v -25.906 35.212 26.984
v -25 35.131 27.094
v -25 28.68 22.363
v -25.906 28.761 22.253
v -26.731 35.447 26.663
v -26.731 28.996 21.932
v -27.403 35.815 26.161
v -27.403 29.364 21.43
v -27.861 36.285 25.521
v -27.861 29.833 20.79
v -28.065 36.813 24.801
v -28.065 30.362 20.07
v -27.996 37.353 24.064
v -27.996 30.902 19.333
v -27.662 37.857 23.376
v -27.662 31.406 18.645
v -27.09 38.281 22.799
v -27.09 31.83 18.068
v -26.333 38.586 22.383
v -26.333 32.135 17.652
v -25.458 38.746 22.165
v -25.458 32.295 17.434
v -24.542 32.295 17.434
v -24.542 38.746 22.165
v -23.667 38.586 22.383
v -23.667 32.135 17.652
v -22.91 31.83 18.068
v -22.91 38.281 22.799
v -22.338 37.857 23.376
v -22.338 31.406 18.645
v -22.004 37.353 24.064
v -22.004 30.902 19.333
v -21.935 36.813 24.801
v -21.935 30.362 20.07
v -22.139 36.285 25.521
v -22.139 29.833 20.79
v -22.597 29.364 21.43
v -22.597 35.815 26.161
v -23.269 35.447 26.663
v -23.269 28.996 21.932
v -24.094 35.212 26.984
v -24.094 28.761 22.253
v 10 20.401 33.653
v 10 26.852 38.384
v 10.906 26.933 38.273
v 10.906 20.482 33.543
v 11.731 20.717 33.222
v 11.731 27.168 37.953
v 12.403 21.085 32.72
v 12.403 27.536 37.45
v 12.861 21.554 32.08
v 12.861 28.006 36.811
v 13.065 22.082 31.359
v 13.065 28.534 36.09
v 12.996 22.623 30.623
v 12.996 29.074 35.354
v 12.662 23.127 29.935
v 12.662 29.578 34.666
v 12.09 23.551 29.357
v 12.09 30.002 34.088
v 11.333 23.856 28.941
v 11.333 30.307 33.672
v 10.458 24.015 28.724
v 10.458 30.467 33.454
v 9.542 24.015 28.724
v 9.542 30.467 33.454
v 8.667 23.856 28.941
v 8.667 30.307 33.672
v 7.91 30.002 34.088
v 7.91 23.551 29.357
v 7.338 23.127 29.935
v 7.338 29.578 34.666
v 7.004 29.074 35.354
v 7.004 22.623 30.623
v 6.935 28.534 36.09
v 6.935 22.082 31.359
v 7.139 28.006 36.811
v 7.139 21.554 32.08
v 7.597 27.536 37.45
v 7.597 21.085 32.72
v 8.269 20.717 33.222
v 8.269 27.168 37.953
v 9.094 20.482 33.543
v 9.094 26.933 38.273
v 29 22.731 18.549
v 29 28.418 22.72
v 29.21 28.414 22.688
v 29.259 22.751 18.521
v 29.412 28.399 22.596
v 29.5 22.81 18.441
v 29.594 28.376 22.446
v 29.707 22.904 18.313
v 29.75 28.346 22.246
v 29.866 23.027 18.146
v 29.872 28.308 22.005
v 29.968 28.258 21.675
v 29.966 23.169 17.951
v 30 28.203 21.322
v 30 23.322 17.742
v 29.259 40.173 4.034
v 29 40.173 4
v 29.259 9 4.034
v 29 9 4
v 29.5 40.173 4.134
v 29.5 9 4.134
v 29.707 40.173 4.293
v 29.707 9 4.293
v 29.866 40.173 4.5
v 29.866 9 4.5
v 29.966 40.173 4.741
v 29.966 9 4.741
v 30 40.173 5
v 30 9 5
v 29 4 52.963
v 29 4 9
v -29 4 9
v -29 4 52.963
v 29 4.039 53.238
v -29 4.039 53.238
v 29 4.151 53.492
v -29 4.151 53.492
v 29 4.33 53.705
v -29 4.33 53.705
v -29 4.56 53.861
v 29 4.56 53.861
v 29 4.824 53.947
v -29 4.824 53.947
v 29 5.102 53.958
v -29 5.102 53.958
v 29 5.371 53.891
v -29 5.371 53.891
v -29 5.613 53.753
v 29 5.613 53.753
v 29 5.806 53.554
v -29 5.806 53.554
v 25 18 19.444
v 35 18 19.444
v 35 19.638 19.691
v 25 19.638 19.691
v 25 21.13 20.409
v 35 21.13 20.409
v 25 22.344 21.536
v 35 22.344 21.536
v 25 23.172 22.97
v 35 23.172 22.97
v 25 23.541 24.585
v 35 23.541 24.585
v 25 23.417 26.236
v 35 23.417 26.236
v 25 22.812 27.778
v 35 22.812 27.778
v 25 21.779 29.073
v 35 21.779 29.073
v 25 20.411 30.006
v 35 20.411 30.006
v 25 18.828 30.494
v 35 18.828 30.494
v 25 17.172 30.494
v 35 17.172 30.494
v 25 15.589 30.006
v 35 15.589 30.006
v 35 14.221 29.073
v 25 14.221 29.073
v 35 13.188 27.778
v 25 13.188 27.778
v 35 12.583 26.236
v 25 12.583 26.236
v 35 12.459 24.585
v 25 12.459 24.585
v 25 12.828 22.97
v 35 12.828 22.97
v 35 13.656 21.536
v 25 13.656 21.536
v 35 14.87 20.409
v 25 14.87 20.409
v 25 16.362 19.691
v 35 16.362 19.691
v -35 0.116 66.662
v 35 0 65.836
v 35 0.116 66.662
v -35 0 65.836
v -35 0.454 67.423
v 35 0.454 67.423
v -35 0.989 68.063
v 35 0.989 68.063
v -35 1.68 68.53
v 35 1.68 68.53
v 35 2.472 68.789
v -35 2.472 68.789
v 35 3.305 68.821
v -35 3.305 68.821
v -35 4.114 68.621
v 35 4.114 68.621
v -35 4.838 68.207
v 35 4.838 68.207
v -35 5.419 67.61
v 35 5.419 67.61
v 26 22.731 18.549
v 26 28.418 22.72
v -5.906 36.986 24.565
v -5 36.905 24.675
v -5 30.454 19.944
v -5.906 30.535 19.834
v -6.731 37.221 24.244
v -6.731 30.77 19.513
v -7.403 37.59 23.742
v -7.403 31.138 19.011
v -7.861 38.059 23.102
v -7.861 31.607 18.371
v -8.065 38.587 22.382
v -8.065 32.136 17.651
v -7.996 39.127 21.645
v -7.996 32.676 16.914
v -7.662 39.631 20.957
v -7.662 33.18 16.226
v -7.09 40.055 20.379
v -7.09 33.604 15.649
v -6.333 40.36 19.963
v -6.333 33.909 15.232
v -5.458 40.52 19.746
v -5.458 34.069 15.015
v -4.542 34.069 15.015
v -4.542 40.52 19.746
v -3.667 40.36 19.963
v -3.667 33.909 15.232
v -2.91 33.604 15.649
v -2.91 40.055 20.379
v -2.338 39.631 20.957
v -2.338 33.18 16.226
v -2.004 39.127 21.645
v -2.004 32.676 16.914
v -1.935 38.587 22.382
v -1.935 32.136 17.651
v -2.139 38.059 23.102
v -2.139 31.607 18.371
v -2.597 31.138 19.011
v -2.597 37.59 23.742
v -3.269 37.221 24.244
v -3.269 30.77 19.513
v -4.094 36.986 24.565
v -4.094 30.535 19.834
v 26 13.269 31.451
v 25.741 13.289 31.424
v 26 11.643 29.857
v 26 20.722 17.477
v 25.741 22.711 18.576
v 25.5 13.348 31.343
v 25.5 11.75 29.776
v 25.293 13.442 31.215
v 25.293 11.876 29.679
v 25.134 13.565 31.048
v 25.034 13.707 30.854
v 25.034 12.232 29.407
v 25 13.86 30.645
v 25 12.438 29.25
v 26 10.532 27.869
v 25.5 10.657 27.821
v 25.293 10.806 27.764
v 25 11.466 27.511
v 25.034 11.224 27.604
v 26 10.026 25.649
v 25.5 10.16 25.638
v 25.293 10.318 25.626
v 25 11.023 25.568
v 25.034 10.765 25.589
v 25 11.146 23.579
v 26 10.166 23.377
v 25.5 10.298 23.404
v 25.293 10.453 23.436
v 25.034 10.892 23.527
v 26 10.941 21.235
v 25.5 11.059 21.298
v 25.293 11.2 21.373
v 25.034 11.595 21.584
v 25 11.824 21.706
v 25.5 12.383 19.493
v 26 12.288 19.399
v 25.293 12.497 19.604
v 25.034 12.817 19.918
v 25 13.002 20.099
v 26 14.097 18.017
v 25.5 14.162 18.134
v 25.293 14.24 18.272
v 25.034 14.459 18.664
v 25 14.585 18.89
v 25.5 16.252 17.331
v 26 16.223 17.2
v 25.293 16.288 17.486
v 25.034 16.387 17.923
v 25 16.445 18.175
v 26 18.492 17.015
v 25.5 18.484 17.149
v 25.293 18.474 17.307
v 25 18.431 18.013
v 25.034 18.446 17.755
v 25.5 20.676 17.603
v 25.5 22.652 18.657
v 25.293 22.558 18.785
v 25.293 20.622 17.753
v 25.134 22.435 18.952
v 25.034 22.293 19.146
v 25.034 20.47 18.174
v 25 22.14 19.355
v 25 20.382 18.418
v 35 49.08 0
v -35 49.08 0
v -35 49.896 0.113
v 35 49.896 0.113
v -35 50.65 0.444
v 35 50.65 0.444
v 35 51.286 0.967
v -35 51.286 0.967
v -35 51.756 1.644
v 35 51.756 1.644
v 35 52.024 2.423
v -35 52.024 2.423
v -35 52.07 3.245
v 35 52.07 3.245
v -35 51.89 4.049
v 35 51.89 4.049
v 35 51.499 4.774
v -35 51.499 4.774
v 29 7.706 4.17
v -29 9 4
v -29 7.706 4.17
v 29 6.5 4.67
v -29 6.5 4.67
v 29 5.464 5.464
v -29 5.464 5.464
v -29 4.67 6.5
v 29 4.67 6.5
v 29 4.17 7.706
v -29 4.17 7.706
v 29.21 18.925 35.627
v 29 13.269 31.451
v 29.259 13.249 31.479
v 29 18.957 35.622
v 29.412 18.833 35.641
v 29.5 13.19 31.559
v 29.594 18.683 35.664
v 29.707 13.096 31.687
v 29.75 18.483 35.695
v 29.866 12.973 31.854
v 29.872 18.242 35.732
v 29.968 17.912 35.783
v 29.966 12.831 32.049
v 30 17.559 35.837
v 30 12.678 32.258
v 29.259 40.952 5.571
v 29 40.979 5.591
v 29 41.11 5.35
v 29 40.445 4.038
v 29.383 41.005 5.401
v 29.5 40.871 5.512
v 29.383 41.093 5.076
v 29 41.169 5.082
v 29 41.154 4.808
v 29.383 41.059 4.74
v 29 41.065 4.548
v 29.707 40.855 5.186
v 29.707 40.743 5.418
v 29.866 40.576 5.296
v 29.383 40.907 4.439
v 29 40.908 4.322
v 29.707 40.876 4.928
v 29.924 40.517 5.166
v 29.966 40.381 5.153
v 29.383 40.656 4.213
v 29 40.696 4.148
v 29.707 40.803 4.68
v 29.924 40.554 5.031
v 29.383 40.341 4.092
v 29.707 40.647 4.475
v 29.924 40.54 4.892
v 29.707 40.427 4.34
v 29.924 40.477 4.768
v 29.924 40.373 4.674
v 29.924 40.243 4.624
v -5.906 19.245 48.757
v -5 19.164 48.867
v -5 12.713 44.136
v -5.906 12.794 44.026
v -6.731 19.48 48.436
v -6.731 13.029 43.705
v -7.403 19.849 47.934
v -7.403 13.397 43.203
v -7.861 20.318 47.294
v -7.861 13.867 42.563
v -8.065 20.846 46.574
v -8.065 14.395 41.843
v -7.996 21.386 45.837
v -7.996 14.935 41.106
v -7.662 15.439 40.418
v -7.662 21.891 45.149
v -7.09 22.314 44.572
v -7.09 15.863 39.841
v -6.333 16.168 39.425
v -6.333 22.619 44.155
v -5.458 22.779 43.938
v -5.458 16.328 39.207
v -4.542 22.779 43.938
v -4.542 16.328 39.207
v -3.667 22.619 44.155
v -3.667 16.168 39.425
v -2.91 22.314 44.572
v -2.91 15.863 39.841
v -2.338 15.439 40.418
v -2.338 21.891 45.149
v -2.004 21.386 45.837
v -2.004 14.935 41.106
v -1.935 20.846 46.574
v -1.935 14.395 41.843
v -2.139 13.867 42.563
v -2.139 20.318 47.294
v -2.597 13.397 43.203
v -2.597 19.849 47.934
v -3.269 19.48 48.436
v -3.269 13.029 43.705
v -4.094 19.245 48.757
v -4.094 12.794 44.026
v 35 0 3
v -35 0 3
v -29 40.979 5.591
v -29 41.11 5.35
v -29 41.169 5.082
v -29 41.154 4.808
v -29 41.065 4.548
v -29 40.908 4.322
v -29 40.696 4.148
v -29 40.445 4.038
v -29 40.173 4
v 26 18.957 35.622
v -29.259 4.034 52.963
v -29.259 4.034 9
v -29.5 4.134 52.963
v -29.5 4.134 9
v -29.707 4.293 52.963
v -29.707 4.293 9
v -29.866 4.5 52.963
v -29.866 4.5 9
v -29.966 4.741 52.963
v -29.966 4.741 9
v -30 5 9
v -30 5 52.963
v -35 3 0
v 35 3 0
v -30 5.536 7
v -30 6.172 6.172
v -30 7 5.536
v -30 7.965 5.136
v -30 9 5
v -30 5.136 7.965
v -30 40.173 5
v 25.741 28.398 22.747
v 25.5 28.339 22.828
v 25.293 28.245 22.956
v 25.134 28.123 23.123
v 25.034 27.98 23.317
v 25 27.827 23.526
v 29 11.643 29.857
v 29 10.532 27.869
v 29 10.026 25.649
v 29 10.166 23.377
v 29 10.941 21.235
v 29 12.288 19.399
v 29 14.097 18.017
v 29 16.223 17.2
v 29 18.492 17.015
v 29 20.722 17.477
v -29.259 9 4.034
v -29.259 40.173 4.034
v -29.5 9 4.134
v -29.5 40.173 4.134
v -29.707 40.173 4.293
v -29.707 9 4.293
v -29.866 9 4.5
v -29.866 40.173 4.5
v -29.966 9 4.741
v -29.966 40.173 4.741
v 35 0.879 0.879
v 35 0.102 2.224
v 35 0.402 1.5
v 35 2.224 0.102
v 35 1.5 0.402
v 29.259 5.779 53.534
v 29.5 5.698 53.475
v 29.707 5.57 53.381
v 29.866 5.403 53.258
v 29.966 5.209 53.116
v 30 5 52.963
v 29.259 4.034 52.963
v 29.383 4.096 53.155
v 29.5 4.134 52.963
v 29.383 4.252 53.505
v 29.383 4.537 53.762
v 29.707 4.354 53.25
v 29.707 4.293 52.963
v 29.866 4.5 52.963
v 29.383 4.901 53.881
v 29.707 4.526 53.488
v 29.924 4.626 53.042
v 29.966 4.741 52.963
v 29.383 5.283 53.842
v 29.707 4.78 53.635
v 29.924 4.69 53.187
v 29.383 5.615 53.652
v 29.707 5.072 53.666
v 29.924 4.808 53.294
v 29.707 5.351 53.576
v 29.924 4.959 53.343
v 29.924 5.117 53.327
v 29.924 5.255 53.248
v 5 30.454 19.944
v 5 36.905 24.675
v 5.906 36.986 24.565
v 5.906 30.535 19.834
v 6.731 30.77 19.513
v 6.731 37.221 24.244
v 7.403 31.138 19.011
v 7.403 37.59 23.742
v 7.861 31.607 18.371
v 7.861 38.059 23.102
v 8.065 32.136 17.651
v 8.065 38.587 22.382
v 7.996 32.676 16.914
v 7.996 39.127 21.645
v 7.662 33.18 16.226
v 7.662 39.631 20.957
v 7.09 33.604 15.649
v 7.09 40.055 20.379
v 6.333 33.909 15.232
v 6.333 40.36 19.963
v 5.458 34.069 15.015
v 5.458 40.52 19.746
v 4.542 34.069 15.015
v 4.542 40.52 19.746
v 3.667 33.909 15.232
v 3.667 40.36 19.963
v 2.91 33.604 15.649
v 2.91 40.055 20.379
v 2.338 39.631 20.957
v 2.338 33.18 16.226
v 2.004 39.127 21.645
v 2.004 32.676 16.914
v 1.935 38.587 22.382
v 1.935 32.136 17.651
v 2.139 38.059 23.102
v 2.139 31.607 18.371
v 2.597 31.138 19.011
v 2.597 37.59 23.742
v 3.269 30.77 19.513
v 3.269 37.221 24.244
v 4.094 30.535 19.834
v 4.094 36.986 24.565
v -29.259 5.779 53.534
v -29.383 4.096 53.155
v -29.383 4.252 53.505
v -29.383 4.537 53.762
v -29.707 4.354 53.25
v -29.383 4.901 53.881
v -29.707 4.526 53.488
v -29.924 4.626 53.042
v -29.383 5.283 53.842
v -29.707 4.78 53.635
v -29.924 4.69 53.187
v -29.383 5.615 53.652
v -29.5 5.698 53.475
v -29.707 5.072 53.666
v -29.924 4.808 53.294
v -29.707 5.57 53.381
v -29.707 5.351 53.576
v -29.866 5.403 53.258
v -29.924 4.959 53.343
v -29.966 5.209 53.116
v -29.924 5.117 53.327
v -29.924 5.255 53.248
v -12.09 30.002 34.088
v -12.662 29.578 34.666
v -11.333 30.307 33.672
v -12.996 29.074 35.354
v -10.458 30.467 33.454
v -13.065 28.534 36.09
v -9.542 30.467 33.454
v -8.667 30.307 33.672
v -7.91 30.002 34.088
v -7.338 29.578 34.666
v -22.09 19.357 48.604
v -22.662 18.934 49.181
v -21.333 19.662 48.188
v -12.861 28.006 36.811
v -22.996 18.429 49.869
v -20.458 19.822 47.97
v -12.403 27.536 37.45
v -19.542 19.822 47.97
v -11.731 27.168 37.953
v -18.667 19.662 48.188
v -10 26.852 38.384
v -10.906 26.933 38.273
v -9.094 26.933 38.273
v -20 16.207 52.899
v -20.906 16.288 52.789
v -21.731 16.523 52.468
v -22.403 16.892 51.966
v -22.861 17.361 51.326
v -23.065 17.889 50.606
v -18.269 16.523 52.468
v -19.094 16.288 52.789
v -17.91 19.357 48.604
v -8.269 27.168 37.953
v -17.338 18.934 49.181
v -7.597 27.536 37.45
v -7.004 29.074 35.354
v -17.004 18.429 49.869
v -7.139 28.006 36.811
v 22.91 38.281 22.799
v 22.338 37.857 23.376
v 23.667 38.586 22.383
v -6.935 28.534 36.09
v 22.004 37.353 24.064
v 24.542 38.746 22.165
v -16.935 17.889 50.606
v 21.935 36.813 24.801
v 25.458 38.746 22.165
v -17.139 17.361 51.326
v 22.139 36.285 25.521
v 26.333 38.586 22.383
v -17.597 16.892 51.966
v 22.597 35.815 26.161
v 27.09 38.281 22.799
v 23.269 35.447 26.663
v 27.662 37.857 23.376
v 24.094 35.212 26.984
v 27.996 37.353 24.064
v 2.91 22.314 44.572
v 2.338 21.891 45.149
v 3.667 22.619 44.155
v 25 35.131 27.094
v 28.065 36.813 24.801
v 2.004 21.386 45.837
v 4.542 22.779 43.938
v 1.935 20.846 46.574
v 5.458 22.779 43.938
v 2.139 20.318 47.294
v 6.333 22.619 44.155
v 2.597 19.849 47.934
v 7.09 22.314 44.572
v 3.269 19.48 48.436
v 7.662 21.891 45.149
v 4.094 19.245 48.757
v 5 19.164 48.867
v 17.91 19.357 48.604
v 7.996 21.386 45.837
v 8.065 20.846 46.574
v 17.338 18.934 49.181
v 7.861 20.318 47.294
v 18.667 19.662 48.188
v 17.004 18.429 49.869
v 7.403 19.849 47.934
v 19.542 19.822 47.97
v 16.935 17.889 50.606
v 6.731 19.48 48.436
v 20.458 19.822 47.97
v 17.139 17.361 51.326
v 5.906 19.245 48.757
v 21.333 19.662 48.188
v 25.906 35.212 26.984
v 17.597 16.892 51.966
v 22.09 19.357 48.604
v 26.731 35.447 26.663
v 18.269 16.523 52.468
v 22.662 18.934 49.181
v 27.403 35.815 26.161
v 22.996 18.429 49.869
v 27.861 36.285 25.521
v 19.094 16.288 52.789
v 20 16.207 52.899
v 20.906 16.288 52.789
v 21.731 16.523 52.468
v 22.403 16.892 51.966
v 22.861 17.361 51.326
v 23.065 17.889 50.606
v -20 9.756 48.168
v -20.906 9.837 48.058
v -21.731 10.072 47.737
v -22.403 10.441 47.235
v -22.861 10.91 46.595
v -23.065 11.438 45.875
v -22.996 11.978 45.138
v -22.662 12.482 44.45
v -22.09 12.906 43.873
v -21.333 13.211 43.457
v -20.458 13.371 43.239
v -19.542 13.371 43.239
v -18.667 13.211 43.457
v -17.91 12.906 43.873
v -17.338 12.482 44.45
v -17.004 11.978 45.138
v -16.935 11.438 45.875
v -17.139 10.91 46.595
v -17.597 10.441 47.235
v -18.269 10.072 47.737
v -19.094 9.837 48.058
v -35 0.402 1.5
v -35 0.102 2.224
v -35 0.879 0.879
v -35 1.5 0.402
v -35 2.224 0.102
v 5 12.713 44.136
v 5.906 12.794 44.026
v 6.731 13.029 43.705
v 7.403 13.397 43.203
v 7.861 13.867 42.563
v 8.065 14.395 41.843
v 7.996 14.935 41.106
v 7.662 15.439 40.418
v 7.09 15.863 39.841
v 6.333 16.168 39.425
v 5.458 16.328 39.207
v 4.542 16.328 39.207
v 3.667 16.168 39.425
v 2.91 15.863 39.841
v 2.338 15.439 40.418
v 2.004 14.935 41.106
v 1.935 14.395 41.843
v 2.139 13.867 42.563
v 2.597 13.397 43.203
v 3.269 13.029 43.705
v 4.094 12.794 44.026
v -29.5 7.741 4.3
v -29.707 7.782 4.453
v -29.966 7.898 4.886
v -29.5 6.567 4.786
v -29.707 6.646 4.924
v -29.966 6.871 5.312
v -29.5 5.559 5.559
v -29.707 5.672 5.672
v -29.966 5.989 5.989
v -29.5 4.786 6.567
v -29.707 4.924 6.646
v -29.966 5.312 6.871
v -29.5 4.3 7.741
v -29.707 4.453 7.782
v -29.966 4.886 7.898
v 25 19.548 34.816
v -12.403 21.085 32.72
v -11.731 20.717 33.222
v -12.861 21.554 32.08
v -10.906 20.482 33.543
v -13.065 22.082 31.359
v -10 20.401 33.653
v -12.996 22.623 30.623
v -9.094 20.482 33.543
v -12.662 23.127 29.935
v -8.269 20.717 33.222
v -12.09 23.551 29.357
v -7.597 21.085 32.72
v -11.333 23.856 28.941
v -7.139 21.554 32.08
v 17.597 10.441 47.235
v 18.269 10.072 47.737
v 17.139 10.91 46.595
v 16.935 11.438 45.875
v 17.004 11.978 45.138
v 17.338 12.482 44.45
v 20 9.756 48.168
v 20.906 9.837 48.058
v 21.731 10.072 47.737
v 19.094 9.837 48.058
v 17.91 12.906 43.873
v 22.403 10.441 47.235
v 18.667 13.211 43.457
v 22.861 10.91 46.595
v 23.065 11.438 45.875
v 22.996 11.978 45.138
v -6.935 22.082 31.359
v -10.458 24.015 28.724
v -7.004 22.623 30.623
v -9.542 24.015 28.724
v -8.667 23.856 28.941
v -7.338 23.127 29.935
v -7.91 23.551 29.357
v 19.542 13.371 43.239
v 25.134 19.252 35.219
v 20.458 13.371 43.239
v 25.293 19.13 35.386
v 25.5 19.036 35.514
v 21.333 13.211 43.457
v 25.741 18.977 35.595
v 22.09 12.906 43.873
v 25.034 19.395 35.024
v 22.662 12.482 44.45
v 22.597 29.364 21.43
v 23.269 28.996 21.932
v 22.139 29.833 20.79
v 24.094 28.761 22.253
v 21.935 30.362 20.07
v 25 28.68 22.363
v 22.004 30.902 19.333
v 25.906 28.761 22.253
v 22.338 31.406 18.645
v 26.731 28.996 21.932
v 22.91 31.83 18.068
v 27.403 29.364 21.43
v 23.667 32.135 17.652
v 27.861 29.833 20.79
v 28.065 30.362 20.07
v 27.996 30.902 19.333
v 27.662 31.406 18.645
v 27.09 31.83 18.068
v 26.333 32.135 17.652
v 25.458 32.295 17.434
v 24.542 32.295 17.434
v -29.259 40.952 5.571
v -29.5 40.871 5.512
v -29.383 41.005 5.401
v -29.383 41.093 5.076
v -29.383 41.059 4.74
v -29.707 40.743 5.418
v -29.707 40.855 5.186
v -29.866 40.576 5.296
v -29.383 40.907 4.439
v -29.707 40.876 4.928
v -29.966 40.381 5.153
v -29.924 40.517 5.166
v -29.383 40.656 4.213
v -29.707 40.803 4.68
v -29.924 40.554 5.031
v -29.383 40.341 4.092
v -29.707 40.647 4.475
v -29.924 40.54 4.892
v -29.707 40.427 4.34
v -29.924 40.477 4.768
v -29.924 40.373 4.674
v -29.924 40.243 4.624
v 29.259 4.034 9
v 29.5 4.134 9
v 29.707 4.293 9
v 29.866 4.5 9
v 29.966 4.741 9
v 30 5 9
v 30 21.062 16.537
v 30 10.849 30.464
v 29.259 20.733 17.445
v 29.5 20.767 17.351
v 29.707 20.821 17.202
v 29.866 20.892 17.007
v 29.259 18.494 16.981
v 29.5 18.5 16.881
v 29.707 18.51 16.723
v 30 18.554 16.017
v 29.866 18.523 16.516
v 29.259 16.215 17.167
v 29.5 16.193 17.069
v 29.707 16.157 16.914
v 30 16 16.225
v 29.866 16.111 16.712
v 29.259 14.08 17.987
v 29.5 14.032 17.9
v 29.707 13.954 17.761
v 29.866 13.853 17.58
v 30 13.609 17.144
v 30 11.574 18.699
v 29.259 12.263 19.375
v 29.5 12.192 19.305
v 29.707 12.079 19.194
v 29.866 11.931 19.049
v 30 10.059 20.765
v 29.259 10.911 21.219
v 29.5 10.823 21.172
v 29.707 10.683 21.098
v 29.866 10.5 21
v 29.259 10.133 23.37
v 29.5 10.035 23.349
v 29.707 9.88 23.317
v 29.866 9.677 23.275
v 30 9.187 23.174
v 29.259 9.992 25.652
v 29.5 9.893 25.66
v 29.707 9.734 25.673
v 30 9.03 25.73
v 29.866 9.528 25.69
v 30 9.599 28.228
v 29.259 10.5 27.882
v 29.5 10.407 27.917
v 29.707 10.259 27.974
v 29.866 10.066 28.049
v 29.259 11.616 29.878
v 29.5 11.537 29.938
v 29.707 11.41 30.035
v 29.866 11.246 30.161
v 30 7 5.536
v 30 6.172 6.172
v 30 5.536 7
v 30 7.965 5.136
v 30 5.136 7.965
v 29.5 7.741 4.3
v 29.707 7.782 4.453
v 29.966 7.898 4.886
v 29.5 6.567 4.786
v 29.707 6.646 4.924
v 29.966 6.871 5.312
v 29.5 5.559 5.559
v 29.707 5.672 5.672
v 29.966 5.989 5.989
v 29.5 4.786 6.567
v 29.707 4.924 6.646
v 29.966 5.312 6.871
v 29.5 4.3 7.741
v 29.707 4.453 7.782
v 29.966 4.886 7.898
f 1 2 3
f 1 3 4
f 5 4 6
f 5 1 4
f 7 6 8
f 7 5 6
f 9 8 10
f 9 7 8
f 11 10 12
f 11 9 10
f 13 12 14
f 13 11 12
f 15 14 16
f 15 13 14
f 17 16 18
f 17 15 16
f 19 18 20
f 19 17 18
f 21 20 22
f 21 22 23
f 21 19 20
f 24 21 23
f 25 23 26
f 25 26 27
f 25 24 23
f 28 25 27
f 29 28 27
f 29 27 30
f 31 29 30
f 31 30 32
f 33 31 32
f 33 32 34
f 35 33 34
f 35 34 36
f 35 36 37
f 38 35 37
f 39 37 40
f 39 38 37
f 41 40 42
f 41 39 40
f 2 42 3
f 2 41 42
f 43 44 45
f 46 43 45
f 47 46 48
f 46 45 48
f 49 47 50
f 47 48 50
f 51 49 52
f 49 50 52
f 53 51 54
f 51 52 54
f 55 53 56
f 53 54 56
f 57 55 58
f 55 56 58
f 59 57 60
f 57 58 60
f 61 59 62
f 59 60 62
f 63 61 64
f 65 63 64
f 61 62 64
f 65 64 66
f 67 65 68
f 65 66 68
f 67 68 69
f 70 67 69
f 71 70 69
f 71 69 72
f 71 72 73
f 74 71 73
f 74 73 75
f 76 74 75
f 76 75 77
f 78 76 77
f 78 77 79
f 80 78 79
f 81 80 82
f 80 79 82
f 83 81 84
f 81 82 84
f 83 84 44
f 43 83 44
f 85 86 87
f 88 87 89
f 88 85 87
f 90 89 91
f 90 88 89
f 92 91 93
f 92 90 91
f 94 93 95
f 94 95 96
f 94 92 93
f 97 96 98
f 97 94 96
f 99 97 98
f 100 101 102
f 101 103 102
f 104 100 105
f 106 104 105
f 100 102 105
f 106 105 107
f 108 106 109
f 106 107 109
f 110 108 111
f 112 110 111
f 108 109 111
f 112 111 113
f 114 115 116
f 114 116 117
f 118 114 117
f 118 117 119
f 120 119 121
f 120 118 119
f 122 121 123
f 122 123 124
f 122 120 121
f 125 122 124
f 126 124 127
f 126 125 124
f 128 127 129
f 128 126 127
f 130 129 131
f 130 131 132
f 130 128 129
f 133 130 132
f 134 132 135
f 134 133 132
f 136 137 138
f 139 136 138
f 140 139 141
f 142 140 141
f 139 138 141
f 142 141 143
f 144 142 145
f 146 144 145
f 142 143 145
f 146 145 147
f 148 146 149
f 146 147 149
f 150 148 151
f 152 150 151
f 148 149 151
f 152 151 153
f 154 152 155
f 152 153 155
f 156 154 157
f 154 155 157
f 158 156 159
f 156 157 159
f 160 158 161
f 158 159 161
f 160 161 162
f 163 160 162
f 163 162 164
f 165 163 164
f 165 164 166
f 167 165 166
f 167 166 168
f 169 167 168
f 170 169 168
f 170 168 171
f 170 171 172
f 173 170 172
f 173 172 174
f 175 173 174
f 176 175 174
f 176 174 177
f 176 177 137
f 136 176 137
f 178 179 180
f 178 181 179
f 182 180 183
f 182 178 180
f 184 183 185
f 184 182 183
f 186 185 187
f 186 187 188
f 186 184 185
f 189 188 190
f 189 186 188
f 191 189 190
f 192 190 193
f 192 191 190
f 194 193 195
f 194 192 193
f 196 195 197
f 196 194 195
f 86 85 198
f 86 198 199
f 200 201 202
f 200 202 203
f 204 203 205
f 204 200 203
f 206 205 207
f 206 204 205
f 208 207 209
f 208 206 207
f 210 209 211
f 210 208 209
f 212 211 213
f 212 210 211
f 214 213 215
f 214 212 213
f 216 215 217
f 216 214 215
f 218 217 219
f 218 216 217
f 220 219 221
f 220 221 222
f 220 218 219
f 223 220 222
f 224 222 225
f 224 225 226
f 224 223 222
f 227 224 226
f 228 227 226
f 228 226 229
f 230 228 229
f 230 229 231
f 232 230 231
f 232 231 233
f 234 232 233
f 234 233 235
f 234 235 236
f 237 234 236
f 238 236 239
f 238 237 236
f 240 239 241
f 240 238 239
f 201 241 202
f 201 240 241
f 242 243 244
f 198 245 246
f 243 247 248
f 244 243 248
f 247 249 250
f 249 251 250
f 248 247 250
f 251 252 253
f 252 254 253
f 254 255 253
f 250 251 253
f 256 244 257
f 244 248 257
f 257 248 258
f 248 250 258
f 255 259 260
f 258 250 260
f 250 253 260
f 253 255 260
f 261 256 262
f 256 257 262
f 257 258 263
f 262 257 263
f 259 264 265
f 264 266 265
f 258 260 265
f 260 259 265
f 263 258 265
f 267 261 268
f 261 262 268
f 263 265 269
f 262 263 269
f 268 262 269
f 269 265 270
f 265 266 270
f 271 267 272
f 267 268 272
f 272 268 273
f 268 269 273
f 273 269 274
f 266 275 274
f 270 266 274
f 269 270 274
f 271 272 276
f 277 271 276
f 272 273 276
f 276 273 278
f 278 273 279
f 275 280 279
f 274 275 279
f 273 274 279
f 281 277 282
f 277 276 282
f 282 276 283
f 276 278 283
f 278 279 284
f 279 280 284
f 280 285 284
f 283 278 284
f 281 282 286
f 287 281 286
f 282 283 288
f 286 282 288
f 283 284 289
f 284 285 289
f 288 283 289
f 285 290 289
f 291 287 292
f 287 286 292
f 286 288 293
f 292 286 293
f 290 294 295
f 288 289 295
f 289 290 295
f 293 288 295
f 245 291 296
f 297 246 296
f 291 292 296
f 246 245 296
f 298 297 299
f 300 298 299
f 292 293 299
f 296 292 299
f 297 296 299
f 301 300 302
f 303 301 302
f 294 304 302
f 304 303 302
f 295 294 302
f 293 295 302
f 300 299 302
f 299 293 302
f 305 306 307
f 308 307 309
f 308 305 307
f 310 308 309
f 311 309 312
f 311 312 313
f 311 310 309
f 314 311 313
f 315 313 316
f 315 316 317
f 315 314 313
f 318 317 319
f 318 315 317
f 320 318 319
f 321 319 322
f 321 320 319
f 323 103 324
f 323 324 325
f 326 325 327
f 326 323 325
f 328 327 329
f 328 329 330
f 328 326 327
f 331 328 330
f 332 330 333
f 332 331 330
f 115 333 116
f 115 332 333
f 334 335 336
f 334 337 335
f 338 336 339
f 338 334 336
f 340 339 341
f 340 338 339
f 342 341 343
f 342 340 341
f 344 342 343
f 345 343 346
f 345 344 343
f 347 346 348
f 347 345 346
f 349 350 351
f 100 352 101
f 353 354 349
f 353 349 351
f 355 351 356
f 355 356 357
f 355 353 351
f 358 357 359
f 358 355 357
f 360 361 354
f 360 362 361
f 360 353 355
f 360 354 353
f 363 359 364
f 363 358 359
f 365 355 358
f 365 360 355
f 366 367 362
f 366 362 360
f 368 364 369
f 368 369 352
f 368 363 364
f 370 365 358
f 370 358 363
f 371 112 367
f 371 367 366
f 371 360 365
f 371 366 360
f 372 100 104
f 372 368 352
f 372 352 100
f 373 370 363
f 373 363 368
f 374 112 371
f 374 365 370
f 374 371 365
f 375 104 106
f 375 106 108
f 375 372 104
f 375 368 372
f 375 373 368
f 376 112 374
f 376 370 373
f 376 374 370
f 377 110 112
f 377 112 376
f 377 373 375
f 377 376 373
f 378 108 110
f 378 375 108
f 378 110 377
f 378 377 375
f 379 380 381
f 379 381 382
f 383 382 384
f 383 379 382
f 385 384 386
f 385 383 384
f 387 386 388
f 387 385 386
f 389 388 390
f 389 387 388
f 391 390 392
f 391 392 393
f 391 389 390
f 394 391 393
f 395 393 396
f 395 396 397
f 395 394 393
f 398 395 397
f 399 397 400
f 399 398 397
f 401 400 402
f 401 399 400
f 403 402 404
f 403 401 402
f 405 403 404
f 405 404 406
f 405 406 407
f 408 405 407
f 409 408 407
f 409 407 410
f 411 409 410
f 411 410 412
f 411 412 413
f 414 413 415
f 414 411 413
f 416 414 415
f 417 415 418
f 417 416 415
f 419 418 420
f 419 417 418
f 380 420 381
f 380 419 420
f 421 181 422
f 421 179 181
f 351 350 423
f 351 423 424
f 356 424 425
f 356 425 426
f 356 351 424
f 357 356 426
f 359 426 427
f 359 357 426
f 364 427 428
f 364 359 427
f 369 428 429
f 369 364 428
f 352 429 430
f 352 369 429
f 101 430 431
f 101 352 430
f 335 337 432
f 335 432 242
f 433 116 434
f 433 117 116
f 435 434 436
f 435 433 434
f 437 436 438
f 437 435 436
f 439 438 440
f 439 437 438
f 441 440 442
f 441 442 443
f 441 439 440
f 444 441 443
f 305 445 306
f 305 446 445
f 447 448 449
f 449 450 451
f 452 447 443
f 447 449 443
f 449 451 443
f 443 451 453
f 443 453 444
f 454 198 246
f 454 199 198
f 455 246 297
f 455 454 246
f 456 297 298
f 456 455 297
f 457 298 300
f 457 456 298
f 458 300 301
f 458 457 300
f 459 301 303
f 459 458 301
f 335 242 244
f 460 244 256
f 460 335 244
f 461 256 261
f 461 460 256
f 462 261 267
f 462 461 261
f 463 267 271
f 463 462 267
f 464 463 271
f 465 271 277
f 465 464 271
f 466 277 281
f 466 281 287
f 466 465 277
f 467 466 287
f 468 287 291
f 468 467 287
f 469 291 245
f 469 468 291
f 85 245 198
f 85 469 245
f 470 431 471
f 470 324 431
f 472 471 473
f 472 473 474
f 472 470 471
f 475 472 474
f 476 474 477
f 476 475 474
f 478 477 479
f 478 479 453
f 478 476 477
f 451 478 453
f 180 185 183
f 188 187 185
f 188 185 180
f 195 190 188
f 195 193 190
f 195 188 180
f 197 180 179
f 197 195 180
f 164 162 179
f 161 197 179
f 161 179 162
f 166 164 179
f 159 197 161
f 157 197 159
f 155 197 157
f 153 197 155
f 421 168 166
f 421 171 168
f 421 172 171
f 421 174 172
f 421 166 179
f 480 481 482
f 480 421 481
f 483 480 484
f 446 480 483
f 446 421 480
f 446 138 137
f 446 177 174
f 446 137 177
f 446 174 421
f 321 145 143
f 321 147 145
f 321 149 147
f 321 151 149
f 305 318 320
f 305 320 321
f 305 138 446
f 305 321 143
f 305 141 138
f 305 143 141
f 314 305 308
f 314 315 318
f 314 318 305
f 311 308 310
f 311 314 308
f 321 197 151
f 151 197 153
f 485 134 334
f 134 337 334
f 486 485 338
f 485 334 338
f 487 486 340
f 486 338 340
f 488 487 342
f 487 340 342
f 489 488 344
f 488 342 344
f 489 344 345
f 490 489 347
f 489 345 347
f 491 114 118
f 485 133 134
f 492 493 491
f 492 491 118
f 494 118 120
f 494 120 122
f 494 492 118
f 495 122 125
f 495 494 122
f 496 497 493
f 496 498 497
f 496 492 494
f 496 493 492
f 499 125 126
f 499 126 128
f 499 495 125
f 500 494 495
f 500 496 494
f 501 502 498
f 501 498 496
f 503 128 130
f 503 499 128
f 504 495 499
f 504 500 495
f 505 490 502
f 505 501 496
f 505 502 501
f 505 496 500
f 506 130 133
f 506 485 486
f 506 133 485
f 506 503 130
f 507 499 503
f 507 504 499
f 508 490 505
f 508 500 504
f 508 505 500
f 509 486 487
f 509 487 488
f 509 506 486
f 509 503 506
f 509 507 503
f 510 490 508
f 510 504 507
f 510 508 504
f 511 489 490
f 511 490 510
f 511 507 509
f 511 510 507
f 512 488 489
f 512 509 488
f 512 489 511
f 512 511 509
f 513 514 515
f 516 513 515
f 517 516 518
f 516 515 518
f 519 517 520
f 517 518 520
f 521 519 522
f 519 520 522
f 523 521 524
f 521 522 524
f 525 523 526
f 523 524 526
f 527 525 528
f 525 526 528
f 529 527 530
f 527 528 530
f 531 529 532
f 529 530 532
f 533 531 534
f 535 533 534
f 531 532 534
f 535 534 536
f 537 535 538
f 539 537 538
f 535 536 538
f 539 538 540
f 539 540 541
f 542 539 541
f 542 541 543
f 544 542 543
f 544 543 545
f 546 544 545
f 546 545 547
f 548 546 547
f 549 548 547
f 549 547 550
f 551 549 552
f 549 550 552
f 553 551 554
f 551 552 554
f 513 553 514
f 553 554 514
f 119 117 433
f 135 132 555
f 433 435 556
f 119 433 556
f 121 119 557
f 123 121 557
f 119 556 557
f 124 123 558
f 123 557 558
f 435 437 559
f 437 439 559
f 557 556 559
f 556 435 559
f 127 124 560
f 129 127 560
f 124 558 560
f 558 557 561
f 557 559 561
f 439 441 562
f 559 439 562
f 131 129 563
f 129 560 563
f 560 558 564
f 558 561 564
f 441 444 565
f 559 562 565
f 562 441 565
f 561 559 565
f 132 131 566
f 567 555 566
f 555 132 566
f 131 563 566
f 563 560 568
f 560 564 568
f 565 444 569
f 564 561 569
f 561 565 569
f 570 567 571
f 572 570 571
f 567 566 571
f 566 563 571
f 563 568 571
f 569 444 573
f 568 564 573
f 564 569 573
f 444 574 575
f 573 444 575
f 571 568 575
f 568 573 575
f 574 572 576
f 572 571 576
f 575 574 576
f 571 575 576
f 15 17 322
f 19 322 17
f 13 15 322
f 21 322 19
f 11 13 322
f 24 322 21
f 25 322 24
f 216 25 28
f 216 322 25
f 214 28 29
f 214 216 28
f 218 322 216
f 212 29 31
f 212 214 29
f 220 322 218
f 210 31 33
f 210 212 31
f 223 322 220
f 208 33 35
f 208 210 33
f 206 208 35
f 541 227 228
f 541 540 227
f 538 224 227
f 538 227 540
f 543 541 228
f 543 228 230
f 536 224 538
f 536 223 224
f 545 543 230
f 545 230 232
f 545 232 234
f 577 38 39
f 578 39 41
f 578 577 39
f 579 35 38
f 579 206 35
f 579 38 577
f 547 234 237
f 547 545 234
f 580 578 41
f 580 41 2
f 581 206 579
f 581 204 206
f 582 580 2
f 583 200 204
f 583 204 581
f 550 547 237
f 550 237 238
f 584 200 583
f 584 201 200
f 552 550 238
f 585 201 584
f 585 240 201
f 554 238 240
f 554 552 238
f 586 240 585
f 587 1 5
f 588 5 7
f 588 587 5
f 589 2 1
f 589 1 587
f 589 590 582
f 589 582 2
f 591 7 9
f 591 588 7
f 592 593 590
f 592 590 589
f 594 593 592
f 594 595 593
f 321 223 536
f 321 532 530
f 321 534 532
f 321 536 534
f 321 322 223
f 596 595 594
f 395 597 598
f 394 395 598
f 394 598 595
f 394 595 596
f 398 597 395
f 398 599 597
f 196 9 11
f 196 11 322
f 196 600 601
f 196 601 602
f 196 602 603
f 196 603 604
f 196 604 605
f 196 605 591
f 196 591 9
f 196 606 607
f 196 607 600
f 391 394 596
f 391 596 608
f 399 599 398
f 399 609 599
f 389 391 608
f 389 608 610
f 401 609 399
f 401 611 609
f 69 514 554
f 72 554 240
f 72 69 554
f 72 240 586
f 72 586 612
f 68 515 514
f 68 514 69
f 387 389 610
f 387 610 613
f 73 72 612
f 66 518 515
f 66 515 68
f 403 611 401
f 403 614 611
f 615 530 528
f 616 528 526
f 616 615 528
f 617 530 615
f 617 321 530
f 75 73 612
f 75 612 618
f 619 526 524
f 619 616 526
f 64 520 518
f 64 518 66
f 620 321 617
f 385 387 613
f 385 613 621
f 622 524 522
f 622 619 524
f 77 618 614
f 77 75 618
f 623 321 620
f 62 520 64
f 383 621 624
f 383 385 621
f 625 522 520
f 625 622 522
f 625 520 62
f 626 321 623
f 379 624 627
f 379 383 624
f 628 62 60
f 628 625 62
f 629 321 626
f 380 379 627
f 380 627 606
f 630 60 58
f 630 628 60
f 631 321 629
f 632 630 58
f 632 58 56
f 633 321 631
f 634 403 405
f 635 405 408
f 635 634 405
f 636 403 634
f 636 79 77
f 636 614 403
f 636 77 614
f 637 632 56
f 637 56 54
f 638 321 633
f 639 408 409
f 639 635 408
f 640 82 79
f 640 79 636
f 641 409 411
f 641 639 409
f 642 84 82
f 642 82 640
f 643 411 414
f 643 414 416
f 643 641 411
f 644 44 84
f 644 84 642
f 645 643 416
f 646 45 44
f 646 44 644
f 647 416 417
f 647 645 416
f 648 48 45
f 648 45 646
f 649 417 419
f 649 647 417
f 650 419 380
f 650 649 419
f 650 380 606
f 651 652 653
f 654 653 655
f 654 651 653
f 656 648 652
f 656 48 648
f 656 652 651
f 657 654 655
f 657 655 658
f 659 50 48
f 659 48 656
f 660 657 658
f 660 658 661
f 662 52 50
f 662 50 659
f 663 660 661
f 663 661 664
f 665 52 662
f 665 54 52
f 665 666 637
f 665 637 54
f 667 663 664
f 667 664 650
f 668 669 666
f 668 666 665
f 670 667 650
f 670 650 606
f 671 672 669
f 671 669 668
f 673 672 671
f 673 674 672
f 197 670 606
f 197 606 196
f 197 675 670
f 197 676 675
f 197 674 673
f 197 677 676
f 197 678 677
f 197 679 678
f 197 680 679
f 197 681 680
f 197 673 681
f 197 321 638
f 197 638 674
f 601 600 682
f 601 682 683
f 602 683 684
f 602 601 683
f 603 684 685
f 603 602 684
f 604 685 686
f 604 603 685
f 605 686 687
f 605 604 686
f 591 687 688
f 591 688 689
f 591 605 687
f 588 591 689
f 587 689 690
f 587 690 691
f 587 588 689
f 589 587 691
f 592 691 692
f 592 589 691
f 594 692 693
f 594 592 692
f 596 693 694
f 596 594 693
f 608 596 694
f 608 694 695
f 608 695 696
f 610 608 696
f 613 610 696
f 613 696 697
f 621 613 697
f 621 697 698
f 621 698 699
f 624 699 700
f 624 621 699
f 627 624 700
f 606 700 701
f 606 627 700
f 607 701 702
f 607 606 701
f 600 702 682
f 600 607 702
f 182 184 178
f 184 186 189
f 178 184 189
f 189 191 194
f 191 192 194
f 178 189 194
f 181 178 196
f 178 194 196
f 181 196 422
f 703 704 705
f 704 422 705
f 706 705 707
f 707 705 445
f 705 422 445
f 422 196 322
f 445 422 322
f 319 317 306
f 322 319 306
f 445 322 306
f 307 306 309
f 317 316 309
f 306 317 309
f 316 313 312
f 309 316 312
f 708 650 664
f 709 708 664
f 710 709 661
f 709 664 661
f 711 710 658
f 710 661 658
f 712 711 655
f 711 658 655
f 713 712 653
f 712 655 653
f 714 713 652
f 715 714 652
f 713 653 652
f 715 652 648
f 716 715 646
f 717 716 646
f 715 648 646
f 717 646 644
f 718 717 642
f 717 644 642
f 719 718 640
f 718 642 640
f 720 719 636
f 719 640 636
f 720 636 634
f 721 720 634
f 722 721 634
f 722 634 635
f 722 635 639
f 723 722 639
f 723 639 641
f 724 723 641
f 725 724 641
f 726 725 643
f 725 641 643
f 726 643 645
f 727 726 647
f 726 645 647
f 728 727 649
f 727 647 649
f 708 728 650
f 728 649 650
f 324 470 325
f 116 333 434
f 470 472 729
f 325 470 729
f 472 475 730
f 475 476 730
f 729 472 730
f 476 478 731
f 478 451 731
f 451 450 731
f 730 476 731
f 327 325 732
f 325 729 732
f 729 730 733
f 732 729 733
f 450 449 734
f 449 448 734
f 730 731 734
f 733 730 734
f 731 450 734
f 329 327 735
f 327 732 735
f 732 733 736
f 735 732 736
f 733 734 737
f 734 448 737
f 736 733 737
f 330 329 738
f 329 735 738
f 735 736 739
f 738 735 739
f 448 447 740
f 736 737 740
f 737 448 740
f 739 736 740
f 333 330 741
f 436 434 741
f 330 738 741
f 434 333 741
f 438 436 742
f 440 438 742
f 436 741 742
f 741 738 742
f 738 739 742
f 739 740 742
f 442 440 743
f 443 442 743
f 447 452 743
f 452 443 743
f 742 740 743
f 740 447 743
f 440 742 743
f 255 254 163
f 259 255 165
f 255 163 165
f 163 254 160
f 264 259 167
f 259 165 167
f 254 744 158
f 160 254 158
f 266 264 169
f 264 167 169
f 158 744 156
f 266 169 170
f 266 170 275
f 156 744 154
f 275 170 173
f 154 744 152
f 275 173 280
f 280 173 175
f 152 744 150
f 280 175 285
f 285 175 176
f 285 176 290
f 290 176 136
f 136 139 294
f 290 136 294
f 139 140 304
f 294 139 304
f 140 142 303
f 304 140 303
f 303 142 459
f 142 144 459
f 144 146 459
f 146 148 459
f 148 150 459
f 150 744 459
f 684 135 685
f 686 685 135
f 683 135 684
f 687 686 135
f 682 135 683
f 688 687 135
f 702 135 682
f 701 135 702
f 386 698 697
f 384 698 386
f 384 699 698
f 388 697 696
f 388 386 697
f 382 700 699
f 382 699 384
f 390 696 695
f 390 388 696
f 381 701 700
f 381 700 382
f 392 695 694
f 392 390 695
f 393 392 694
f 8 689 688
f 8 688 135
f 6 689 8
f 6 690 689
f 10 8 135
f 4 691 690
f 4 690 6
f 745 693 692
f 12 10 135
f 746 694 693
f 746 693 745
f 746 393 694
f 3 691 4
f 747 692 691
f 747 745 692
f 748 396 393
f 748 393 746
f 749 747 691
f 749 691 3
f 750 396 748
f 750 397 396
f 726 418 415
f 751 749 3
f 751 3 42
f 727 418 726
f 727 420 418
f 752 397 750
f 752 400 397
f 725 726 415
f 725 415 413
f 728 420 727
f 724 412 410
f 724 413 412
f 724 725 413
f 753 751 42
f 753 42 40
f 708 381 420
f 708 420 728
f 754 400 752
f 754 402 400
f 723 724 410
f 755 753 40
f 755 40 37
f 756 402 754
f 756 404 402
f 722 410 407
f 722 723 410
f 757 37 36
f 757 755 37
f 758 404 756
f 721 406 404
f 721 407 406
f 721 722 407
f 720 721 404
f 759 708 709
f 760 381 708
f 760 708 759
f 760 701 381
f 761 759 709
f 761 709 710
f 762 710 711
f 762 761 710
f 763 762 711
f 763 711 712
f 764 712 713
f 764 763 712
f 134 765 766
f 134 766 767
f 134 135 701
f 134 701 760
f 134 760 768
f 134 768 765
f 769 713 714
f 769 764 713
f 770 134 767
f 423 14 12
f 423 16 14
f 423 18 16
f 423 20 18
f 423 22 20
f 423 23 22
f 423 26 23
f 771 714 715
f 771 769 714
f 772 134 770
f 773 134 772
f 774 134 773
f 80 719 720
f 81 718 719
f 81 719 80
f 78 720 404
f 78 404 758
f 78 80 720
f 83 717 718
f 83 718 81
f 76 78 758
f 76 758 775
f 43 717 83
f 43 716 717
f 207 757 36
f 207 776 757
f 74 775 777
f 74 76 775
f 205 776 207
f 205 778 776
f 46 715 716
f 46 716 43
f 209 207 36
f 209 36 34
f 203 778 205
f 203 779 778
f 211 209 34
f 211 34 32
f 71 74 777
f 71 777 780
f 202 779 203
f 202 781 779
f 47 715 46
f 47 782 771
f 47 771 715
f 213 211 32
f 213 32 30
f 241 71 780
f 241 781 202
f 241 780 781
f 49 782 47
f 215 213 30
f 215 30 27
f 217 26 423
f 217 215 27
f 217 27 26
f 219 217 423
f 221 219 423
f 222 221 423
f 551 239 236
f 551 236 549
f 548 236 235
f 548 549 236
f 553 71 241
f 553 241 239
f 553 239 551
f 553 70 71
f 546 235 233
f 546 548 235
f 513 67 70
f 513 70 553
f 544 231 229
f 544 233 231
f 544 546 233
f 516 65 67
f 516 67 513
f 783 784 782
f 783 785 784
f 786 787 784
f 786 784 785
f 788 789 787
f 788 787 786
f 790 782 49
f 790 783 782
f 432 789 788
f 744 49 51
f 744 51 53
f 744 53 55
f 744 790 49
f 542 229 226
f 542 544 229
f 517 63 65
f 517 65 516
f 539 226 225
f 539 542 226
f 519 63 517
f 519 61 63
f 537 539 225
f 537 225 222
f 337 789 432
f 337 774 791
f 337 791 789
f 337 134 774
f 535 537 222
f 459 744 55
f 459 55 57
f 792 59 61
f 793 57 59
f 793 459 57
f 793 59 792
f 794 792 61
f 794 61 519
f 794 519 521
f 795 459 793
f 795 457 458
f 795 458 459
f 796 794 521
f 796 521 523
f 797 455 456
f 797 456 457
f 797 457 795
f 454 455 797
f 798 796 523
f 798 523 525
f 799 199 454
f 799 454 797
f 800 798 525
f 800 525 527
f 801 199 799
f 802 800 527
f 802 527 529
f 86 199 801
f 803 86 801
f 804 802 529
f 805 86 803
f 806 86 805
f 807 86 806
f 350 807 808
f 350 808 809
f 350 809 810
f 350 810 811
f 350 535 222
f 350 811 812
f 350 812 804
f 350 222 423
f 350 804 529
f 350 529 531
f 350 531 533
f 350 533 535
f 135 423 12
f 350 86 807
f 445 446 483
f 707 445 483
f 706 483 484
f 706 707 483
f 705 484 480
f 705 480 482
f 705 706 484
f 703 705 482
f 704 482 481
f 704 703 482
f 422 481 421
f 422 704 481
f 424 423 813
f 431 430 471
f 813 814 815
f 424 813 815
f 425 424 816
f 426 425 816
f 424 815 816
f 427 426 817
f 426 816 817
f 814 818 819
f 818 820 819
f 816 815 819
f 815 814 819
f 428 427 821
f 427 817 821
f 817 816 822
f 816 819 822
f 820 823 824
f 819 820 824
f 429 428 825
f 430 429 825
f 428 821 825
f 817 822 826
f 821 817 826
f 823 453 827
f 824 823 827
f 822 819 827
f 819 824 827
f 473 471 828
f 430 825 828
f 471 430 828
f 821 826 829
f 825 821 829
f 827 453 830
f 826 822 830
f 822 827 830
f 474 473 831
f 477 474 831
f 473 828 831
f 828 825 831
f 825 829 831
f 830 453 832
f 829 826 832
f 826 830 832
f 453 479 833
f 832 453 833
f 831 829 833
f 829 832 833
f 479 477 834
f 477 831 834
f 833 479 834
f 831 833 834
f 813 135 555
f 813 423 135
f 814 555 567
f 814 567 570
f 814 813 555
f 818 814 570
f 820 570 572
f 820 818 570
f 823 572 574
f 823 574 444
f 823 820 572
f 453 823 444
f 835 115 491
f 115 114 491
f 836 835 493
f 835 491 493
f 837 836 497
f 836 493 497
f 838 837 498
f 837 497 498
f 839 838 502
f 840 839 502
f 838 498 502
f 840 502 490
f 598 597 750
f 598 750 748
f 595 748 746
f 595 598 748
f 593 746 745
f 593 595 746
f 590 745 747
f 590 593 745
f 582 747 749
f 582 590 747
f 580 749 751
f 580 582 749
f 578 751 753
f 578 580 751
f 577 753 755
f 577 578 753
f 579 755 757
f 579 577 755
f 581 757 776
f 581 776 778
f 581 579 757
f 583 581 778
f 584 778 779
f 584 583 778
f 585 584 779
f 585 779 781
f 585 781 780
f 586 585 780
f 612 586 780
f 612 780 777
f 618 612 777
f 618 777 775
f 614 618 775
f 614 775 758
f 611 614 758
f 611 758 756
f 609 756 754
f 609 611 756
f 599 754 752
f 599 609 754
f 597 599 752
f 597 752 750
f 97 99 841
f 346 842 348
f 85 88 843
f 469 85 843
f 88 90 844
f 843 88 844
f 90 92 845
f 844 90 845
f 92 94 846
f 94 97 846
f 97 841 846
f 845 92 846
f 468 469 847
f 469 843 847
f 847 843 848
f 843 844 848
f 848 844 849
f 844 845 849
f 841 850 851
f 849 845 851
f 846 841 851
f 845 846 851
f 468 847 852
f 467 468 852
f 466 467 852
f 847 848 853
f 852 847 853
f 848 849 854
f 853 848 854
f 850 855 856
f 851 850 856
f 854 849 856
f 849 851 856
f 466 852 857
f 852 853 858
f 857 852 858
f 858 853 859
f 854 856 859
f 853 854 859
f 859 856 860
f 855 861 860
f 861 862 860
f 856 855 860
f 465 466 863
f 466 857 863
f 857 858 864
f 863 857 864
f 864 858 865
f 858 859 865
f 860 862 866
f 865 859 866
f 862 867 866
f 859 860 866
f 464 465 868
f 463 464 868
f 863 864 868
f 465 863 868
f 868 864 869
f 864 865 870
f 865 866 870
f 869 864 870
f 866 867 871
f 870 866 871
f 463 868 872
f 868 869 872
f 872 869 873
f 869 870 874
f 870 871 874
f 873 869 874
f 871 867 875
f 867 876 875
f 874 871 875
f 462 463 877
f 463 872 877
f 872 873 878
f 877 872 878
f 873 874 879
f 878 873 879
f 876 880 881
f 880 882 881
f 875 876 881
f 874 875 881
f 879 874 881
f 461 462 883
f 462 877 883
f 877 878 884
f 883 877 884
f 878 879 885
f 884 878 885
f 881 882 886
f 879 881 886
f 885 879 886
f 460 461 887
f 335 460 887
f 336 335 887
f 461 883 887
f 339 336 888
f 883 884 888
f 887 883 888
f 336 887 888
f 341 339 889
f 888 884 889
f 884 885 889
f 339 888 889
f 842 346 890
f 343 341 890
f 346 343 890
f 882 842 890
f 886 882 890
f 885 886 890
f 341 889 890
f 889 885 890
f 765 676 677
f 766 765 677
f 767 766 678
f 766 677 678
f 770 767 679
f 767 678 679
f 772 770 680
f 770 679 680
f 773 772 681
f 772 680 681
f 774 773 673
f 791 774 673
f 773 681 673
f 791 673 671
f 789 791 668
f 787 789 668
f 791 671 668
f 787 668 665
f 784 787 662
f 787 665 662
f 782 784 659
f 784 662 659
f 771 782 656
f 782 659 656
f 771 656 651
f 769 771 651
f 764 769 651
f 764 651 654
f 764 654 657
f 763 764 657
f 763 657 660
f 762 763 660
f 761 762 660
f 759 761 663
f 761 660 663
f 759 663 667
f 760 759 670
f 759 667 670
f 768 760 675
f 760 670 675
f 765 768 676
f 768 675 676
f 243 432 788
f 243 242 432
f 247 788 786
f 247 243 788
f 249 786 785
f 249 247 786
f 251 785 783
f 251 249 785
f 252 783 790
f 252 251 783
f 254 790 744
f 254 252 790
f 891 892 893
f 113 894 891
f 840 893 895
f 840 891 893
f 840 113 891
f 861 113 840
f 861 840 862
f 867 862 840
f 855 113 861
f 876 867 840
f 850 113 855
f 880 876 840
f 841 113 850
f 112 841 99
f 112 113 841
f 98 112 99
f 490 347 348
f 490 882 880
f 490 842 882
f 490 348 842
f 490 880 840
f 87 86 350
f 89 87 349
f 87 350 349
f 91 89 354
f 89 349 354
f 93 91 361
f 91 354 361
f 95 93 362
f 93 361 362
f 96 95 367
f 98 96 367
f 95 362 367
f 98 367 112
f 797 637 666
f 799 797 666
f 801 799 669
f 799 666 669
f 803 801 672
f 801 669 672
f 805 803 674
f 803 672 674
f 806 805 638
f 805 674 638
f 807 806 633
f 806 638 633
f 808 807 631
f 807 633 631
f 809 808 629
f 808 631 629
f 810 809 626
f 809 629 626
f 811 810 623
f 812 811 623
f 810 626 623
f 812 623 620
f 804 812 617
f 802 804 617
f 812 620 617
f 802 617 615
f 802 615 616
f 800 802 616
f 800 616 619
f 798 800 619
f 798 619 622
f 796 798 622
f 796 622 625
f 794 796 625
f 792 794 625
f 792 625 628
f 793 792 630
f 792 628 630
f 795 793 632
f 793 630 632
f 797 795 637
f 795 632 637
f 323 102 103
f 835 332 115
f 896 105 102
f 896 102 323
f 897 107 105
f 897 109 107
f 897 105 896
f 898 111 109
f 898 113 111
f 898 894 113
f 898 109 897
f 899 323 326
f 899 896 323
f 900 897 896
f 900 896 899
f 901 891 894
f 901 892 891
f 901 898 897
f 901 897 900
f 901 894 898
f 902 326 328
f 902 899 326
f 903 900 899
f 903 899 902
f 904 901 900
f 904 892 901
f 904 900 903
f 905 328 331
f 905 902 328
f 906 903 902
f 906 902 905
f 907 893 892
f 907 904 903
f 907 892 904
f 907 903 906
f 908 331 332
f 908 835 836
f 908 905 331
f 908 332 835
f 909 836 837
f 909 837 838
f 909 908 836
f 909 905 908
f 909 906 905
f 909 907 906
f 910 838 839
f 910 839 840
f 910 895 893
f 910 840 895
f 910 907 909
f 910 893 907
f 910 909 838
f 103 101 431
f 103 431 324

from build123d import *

# Parameters (mm, degrees)
BOSS_EXTRUDE2_DEPTH      = 35
BOSS_EXTRUDE2_DEPTH_BACK = 35
FILLET1_R                = 3
CUT_EXTRUDE1_START       = -5
CUT_EXTRUDE1_DEPTH       = 60
SKETCH6_R                = 3.0734
CUT_EXTRUDE2_DEPTH       = 8
CUT_EXTRUDE3_REACH       = 72
SKETCH7_R                = 5.55625
SKETCH8_R                = 5.55625
BOSS_EXTRUDE3_DEPTH      = 10
FILLET2_R                = 1


with BuildPart() as part:
    # Sketch3 → Boss-Extrude2 (new body, two sides)
    with BuildSketch(Plane(origin=(0, 0, 0), x_dir=(0, 0, -1), z_dir=(1, 0, 0))) as boss_extrude2_sk:
        Polygon((0, 0), (0, 55), (-75, 0), align=None)
    extrude(amount=BOSS_EXTRUDE2_DEPTH)
    extrude(boss_extrude2_sk.sketch, amount=-BOSS_EXTRUDE2_DEPTH_BACK)

    # Fillet1
    fillet1_edges = [part.edges().sort_by_distance(p)[0] for p in [
        (0, 0, 75),
        (0, 55, 0),
        (0, 0, 0),
    ]]
    fillet(fillet1_edges, radius=FILLET1_R)

    # Sketch5 → Cut-Extrude1 (cut)
    with BuildSketch(Plane(origin=(35, 0, 0), x_dir=(0, 0, -1), z_dir=(1, 0, 0)).offset(CUT_EXTRUDE1_START)):
        with BuildLine():
            Line((-4, 40.172688191), (-4, 9))
            ThreePointArc((-4, 9), (-5.464466094, 5.464466094), (-9, 4))
            Line((-9, 4), (-52.962756624, 4))
            ThreePointArc((-52.962756624, 4), (-53.913126287, 4.688877031), (-53.554120287, 5.806404996))
            Line((-53.554120287, 5.806404996), (-5.591363664, 40.979093187))
            ThreePointArc((-5.591363664, 40.979093187), (-4.547984327, 41.064698186), (-4, 40.172688191))
        make_face()
    extrude(amount=-CUT_EXTRUDE1_DEPTH, mode=Mode.SUBTRACT)

    # Sketch6 → Cut-Extrude2 (cut)
    with BuildSketch(Plane(origin=(0, 35.765895954, 26.228323699), x_dir=(1, 0, 0), z_dir=(0, 0.806404996, 0.591363664))):
        with Locations(Location((5, 5, 0), (0, 0, 270))):  # turned: the seam where the file's is
            Circle(SKETCH6_R)
        with Locations(Location((5, -25, 0), (0, 0, 270))):  # turned: the seam where the file's is
            Circle(SKETCH6_R)
        with Locations(Location((20, -30, 0), (0, 0, 270))):  # turned: the seam where the file's is
            Circle(SKETCH6_R)
        with Locations(Location((10, -12, 0), (0, 0, 270))):  # turned: the seam where the file's is
            Circle(SKETCH6_R)
        with Locations(Location((25, 2, 0), (0, 0, 270))):  # turned: the seam where the file's is
            Circle(SKETCH6_R)
    cut_extrude2 = extrude(amount=-CUT_EXTRUDE2_DEPTH, mode=Mode.SUBTRACT)

    # Mirror1: Cut-Extrude2 across plane
    add(cut_extrude2.mirror(Plane(origin=(0, 0, 0), x_dir=(0, 0, 1), z_dir=(1, 0, 0))), mode=Mode.SUBTRACT)

    # Sketch7 → Cut-Extrude3 (cut, up to next)
    with BuildSketch(Plane(origin=(35, 0, 0), x_dir=(0, 0, -1), z_dir=(1, 0, 0)), mode=Mode.PRIVATE) as cut_extrude3_sk1:
        with Locations((-25, 18)):
            Circle(SKETCH7_R)
    cut_extrude3_tool1 = extrude(cut_extrude3_sk1.sketch, amount=-CUT_EXTRUDE3_REACH, mode=Mode.PRIVATE) & part.part
    add(cut_extrude3_tool1.solids().sort_by_distance((35, 18, 25))[0], mode=Mode.SUBTRACT)

    # Sketch8 → Boss-Extrude3 (add)
    with BuildSketch(Plane(origin=(35, 0, 0), x_dir=(0, 0, -1), z_dir=(1, 0, 0))):
        with BuildLine():
            Line((-22.719584828, 28.418397666), (-35.622064762, 18.956579048))
            Line((-35.622064762, 18.956579048), (-31.451239967, 13.269090691))
            ThreePointArc((-31.451239967, 13.269090691), (-20.269090691, 11.548760033), (-18.548760033, 22.730909309))
            Line((-18.548760033, 22.730909309), (-22.719584828, 28.418397666))
        make_face()
        with Locations((-25, 18)):
            Circle(SKETCH8_R, mode=Mode.SUBTRACT)
    extrude(amount=-BOSS_EXTRUDE3_DEPTH)

    # Fillet2
    fillet2_edges = [part.edges().sort_by_distance(p)[0] for p in [
        (30, 12.381492022, 44.588092525),
        (30, 25.574653487, 20.634172431),
        (25, 25.574653487, 20.634172431),
        (30, 11.548760033, 20.269090691),
        (25, 11.548760033, 20.269090691),
        (30, 16.112834869, 33.536652364),
        (25, 16.112834869, 33.536652364),
        (30, 4.688877031, 53.913126287),
        (30, 34.698745426, 14.155474246),
        (30, 41.064698186, 4.547984327),
        (30, 24.586344095, 4),
        (30, 5.464466094, 5.464466094),
        (30, 4, 30.981378312),
        (-30, 4.688877031, 53.913126287),
        (-30, 4, 30.981378312),
        (-30, 5.464466094, 5.464466094),
        (-30, 24.586344095, 4),
        (-30, 41.064698186, 4.547984327),
        (-30, 23.392749091, 29.572741975),
    ]]
    fillet(fillet2_edges, radius=FILLET2_R)


solid = part.part
